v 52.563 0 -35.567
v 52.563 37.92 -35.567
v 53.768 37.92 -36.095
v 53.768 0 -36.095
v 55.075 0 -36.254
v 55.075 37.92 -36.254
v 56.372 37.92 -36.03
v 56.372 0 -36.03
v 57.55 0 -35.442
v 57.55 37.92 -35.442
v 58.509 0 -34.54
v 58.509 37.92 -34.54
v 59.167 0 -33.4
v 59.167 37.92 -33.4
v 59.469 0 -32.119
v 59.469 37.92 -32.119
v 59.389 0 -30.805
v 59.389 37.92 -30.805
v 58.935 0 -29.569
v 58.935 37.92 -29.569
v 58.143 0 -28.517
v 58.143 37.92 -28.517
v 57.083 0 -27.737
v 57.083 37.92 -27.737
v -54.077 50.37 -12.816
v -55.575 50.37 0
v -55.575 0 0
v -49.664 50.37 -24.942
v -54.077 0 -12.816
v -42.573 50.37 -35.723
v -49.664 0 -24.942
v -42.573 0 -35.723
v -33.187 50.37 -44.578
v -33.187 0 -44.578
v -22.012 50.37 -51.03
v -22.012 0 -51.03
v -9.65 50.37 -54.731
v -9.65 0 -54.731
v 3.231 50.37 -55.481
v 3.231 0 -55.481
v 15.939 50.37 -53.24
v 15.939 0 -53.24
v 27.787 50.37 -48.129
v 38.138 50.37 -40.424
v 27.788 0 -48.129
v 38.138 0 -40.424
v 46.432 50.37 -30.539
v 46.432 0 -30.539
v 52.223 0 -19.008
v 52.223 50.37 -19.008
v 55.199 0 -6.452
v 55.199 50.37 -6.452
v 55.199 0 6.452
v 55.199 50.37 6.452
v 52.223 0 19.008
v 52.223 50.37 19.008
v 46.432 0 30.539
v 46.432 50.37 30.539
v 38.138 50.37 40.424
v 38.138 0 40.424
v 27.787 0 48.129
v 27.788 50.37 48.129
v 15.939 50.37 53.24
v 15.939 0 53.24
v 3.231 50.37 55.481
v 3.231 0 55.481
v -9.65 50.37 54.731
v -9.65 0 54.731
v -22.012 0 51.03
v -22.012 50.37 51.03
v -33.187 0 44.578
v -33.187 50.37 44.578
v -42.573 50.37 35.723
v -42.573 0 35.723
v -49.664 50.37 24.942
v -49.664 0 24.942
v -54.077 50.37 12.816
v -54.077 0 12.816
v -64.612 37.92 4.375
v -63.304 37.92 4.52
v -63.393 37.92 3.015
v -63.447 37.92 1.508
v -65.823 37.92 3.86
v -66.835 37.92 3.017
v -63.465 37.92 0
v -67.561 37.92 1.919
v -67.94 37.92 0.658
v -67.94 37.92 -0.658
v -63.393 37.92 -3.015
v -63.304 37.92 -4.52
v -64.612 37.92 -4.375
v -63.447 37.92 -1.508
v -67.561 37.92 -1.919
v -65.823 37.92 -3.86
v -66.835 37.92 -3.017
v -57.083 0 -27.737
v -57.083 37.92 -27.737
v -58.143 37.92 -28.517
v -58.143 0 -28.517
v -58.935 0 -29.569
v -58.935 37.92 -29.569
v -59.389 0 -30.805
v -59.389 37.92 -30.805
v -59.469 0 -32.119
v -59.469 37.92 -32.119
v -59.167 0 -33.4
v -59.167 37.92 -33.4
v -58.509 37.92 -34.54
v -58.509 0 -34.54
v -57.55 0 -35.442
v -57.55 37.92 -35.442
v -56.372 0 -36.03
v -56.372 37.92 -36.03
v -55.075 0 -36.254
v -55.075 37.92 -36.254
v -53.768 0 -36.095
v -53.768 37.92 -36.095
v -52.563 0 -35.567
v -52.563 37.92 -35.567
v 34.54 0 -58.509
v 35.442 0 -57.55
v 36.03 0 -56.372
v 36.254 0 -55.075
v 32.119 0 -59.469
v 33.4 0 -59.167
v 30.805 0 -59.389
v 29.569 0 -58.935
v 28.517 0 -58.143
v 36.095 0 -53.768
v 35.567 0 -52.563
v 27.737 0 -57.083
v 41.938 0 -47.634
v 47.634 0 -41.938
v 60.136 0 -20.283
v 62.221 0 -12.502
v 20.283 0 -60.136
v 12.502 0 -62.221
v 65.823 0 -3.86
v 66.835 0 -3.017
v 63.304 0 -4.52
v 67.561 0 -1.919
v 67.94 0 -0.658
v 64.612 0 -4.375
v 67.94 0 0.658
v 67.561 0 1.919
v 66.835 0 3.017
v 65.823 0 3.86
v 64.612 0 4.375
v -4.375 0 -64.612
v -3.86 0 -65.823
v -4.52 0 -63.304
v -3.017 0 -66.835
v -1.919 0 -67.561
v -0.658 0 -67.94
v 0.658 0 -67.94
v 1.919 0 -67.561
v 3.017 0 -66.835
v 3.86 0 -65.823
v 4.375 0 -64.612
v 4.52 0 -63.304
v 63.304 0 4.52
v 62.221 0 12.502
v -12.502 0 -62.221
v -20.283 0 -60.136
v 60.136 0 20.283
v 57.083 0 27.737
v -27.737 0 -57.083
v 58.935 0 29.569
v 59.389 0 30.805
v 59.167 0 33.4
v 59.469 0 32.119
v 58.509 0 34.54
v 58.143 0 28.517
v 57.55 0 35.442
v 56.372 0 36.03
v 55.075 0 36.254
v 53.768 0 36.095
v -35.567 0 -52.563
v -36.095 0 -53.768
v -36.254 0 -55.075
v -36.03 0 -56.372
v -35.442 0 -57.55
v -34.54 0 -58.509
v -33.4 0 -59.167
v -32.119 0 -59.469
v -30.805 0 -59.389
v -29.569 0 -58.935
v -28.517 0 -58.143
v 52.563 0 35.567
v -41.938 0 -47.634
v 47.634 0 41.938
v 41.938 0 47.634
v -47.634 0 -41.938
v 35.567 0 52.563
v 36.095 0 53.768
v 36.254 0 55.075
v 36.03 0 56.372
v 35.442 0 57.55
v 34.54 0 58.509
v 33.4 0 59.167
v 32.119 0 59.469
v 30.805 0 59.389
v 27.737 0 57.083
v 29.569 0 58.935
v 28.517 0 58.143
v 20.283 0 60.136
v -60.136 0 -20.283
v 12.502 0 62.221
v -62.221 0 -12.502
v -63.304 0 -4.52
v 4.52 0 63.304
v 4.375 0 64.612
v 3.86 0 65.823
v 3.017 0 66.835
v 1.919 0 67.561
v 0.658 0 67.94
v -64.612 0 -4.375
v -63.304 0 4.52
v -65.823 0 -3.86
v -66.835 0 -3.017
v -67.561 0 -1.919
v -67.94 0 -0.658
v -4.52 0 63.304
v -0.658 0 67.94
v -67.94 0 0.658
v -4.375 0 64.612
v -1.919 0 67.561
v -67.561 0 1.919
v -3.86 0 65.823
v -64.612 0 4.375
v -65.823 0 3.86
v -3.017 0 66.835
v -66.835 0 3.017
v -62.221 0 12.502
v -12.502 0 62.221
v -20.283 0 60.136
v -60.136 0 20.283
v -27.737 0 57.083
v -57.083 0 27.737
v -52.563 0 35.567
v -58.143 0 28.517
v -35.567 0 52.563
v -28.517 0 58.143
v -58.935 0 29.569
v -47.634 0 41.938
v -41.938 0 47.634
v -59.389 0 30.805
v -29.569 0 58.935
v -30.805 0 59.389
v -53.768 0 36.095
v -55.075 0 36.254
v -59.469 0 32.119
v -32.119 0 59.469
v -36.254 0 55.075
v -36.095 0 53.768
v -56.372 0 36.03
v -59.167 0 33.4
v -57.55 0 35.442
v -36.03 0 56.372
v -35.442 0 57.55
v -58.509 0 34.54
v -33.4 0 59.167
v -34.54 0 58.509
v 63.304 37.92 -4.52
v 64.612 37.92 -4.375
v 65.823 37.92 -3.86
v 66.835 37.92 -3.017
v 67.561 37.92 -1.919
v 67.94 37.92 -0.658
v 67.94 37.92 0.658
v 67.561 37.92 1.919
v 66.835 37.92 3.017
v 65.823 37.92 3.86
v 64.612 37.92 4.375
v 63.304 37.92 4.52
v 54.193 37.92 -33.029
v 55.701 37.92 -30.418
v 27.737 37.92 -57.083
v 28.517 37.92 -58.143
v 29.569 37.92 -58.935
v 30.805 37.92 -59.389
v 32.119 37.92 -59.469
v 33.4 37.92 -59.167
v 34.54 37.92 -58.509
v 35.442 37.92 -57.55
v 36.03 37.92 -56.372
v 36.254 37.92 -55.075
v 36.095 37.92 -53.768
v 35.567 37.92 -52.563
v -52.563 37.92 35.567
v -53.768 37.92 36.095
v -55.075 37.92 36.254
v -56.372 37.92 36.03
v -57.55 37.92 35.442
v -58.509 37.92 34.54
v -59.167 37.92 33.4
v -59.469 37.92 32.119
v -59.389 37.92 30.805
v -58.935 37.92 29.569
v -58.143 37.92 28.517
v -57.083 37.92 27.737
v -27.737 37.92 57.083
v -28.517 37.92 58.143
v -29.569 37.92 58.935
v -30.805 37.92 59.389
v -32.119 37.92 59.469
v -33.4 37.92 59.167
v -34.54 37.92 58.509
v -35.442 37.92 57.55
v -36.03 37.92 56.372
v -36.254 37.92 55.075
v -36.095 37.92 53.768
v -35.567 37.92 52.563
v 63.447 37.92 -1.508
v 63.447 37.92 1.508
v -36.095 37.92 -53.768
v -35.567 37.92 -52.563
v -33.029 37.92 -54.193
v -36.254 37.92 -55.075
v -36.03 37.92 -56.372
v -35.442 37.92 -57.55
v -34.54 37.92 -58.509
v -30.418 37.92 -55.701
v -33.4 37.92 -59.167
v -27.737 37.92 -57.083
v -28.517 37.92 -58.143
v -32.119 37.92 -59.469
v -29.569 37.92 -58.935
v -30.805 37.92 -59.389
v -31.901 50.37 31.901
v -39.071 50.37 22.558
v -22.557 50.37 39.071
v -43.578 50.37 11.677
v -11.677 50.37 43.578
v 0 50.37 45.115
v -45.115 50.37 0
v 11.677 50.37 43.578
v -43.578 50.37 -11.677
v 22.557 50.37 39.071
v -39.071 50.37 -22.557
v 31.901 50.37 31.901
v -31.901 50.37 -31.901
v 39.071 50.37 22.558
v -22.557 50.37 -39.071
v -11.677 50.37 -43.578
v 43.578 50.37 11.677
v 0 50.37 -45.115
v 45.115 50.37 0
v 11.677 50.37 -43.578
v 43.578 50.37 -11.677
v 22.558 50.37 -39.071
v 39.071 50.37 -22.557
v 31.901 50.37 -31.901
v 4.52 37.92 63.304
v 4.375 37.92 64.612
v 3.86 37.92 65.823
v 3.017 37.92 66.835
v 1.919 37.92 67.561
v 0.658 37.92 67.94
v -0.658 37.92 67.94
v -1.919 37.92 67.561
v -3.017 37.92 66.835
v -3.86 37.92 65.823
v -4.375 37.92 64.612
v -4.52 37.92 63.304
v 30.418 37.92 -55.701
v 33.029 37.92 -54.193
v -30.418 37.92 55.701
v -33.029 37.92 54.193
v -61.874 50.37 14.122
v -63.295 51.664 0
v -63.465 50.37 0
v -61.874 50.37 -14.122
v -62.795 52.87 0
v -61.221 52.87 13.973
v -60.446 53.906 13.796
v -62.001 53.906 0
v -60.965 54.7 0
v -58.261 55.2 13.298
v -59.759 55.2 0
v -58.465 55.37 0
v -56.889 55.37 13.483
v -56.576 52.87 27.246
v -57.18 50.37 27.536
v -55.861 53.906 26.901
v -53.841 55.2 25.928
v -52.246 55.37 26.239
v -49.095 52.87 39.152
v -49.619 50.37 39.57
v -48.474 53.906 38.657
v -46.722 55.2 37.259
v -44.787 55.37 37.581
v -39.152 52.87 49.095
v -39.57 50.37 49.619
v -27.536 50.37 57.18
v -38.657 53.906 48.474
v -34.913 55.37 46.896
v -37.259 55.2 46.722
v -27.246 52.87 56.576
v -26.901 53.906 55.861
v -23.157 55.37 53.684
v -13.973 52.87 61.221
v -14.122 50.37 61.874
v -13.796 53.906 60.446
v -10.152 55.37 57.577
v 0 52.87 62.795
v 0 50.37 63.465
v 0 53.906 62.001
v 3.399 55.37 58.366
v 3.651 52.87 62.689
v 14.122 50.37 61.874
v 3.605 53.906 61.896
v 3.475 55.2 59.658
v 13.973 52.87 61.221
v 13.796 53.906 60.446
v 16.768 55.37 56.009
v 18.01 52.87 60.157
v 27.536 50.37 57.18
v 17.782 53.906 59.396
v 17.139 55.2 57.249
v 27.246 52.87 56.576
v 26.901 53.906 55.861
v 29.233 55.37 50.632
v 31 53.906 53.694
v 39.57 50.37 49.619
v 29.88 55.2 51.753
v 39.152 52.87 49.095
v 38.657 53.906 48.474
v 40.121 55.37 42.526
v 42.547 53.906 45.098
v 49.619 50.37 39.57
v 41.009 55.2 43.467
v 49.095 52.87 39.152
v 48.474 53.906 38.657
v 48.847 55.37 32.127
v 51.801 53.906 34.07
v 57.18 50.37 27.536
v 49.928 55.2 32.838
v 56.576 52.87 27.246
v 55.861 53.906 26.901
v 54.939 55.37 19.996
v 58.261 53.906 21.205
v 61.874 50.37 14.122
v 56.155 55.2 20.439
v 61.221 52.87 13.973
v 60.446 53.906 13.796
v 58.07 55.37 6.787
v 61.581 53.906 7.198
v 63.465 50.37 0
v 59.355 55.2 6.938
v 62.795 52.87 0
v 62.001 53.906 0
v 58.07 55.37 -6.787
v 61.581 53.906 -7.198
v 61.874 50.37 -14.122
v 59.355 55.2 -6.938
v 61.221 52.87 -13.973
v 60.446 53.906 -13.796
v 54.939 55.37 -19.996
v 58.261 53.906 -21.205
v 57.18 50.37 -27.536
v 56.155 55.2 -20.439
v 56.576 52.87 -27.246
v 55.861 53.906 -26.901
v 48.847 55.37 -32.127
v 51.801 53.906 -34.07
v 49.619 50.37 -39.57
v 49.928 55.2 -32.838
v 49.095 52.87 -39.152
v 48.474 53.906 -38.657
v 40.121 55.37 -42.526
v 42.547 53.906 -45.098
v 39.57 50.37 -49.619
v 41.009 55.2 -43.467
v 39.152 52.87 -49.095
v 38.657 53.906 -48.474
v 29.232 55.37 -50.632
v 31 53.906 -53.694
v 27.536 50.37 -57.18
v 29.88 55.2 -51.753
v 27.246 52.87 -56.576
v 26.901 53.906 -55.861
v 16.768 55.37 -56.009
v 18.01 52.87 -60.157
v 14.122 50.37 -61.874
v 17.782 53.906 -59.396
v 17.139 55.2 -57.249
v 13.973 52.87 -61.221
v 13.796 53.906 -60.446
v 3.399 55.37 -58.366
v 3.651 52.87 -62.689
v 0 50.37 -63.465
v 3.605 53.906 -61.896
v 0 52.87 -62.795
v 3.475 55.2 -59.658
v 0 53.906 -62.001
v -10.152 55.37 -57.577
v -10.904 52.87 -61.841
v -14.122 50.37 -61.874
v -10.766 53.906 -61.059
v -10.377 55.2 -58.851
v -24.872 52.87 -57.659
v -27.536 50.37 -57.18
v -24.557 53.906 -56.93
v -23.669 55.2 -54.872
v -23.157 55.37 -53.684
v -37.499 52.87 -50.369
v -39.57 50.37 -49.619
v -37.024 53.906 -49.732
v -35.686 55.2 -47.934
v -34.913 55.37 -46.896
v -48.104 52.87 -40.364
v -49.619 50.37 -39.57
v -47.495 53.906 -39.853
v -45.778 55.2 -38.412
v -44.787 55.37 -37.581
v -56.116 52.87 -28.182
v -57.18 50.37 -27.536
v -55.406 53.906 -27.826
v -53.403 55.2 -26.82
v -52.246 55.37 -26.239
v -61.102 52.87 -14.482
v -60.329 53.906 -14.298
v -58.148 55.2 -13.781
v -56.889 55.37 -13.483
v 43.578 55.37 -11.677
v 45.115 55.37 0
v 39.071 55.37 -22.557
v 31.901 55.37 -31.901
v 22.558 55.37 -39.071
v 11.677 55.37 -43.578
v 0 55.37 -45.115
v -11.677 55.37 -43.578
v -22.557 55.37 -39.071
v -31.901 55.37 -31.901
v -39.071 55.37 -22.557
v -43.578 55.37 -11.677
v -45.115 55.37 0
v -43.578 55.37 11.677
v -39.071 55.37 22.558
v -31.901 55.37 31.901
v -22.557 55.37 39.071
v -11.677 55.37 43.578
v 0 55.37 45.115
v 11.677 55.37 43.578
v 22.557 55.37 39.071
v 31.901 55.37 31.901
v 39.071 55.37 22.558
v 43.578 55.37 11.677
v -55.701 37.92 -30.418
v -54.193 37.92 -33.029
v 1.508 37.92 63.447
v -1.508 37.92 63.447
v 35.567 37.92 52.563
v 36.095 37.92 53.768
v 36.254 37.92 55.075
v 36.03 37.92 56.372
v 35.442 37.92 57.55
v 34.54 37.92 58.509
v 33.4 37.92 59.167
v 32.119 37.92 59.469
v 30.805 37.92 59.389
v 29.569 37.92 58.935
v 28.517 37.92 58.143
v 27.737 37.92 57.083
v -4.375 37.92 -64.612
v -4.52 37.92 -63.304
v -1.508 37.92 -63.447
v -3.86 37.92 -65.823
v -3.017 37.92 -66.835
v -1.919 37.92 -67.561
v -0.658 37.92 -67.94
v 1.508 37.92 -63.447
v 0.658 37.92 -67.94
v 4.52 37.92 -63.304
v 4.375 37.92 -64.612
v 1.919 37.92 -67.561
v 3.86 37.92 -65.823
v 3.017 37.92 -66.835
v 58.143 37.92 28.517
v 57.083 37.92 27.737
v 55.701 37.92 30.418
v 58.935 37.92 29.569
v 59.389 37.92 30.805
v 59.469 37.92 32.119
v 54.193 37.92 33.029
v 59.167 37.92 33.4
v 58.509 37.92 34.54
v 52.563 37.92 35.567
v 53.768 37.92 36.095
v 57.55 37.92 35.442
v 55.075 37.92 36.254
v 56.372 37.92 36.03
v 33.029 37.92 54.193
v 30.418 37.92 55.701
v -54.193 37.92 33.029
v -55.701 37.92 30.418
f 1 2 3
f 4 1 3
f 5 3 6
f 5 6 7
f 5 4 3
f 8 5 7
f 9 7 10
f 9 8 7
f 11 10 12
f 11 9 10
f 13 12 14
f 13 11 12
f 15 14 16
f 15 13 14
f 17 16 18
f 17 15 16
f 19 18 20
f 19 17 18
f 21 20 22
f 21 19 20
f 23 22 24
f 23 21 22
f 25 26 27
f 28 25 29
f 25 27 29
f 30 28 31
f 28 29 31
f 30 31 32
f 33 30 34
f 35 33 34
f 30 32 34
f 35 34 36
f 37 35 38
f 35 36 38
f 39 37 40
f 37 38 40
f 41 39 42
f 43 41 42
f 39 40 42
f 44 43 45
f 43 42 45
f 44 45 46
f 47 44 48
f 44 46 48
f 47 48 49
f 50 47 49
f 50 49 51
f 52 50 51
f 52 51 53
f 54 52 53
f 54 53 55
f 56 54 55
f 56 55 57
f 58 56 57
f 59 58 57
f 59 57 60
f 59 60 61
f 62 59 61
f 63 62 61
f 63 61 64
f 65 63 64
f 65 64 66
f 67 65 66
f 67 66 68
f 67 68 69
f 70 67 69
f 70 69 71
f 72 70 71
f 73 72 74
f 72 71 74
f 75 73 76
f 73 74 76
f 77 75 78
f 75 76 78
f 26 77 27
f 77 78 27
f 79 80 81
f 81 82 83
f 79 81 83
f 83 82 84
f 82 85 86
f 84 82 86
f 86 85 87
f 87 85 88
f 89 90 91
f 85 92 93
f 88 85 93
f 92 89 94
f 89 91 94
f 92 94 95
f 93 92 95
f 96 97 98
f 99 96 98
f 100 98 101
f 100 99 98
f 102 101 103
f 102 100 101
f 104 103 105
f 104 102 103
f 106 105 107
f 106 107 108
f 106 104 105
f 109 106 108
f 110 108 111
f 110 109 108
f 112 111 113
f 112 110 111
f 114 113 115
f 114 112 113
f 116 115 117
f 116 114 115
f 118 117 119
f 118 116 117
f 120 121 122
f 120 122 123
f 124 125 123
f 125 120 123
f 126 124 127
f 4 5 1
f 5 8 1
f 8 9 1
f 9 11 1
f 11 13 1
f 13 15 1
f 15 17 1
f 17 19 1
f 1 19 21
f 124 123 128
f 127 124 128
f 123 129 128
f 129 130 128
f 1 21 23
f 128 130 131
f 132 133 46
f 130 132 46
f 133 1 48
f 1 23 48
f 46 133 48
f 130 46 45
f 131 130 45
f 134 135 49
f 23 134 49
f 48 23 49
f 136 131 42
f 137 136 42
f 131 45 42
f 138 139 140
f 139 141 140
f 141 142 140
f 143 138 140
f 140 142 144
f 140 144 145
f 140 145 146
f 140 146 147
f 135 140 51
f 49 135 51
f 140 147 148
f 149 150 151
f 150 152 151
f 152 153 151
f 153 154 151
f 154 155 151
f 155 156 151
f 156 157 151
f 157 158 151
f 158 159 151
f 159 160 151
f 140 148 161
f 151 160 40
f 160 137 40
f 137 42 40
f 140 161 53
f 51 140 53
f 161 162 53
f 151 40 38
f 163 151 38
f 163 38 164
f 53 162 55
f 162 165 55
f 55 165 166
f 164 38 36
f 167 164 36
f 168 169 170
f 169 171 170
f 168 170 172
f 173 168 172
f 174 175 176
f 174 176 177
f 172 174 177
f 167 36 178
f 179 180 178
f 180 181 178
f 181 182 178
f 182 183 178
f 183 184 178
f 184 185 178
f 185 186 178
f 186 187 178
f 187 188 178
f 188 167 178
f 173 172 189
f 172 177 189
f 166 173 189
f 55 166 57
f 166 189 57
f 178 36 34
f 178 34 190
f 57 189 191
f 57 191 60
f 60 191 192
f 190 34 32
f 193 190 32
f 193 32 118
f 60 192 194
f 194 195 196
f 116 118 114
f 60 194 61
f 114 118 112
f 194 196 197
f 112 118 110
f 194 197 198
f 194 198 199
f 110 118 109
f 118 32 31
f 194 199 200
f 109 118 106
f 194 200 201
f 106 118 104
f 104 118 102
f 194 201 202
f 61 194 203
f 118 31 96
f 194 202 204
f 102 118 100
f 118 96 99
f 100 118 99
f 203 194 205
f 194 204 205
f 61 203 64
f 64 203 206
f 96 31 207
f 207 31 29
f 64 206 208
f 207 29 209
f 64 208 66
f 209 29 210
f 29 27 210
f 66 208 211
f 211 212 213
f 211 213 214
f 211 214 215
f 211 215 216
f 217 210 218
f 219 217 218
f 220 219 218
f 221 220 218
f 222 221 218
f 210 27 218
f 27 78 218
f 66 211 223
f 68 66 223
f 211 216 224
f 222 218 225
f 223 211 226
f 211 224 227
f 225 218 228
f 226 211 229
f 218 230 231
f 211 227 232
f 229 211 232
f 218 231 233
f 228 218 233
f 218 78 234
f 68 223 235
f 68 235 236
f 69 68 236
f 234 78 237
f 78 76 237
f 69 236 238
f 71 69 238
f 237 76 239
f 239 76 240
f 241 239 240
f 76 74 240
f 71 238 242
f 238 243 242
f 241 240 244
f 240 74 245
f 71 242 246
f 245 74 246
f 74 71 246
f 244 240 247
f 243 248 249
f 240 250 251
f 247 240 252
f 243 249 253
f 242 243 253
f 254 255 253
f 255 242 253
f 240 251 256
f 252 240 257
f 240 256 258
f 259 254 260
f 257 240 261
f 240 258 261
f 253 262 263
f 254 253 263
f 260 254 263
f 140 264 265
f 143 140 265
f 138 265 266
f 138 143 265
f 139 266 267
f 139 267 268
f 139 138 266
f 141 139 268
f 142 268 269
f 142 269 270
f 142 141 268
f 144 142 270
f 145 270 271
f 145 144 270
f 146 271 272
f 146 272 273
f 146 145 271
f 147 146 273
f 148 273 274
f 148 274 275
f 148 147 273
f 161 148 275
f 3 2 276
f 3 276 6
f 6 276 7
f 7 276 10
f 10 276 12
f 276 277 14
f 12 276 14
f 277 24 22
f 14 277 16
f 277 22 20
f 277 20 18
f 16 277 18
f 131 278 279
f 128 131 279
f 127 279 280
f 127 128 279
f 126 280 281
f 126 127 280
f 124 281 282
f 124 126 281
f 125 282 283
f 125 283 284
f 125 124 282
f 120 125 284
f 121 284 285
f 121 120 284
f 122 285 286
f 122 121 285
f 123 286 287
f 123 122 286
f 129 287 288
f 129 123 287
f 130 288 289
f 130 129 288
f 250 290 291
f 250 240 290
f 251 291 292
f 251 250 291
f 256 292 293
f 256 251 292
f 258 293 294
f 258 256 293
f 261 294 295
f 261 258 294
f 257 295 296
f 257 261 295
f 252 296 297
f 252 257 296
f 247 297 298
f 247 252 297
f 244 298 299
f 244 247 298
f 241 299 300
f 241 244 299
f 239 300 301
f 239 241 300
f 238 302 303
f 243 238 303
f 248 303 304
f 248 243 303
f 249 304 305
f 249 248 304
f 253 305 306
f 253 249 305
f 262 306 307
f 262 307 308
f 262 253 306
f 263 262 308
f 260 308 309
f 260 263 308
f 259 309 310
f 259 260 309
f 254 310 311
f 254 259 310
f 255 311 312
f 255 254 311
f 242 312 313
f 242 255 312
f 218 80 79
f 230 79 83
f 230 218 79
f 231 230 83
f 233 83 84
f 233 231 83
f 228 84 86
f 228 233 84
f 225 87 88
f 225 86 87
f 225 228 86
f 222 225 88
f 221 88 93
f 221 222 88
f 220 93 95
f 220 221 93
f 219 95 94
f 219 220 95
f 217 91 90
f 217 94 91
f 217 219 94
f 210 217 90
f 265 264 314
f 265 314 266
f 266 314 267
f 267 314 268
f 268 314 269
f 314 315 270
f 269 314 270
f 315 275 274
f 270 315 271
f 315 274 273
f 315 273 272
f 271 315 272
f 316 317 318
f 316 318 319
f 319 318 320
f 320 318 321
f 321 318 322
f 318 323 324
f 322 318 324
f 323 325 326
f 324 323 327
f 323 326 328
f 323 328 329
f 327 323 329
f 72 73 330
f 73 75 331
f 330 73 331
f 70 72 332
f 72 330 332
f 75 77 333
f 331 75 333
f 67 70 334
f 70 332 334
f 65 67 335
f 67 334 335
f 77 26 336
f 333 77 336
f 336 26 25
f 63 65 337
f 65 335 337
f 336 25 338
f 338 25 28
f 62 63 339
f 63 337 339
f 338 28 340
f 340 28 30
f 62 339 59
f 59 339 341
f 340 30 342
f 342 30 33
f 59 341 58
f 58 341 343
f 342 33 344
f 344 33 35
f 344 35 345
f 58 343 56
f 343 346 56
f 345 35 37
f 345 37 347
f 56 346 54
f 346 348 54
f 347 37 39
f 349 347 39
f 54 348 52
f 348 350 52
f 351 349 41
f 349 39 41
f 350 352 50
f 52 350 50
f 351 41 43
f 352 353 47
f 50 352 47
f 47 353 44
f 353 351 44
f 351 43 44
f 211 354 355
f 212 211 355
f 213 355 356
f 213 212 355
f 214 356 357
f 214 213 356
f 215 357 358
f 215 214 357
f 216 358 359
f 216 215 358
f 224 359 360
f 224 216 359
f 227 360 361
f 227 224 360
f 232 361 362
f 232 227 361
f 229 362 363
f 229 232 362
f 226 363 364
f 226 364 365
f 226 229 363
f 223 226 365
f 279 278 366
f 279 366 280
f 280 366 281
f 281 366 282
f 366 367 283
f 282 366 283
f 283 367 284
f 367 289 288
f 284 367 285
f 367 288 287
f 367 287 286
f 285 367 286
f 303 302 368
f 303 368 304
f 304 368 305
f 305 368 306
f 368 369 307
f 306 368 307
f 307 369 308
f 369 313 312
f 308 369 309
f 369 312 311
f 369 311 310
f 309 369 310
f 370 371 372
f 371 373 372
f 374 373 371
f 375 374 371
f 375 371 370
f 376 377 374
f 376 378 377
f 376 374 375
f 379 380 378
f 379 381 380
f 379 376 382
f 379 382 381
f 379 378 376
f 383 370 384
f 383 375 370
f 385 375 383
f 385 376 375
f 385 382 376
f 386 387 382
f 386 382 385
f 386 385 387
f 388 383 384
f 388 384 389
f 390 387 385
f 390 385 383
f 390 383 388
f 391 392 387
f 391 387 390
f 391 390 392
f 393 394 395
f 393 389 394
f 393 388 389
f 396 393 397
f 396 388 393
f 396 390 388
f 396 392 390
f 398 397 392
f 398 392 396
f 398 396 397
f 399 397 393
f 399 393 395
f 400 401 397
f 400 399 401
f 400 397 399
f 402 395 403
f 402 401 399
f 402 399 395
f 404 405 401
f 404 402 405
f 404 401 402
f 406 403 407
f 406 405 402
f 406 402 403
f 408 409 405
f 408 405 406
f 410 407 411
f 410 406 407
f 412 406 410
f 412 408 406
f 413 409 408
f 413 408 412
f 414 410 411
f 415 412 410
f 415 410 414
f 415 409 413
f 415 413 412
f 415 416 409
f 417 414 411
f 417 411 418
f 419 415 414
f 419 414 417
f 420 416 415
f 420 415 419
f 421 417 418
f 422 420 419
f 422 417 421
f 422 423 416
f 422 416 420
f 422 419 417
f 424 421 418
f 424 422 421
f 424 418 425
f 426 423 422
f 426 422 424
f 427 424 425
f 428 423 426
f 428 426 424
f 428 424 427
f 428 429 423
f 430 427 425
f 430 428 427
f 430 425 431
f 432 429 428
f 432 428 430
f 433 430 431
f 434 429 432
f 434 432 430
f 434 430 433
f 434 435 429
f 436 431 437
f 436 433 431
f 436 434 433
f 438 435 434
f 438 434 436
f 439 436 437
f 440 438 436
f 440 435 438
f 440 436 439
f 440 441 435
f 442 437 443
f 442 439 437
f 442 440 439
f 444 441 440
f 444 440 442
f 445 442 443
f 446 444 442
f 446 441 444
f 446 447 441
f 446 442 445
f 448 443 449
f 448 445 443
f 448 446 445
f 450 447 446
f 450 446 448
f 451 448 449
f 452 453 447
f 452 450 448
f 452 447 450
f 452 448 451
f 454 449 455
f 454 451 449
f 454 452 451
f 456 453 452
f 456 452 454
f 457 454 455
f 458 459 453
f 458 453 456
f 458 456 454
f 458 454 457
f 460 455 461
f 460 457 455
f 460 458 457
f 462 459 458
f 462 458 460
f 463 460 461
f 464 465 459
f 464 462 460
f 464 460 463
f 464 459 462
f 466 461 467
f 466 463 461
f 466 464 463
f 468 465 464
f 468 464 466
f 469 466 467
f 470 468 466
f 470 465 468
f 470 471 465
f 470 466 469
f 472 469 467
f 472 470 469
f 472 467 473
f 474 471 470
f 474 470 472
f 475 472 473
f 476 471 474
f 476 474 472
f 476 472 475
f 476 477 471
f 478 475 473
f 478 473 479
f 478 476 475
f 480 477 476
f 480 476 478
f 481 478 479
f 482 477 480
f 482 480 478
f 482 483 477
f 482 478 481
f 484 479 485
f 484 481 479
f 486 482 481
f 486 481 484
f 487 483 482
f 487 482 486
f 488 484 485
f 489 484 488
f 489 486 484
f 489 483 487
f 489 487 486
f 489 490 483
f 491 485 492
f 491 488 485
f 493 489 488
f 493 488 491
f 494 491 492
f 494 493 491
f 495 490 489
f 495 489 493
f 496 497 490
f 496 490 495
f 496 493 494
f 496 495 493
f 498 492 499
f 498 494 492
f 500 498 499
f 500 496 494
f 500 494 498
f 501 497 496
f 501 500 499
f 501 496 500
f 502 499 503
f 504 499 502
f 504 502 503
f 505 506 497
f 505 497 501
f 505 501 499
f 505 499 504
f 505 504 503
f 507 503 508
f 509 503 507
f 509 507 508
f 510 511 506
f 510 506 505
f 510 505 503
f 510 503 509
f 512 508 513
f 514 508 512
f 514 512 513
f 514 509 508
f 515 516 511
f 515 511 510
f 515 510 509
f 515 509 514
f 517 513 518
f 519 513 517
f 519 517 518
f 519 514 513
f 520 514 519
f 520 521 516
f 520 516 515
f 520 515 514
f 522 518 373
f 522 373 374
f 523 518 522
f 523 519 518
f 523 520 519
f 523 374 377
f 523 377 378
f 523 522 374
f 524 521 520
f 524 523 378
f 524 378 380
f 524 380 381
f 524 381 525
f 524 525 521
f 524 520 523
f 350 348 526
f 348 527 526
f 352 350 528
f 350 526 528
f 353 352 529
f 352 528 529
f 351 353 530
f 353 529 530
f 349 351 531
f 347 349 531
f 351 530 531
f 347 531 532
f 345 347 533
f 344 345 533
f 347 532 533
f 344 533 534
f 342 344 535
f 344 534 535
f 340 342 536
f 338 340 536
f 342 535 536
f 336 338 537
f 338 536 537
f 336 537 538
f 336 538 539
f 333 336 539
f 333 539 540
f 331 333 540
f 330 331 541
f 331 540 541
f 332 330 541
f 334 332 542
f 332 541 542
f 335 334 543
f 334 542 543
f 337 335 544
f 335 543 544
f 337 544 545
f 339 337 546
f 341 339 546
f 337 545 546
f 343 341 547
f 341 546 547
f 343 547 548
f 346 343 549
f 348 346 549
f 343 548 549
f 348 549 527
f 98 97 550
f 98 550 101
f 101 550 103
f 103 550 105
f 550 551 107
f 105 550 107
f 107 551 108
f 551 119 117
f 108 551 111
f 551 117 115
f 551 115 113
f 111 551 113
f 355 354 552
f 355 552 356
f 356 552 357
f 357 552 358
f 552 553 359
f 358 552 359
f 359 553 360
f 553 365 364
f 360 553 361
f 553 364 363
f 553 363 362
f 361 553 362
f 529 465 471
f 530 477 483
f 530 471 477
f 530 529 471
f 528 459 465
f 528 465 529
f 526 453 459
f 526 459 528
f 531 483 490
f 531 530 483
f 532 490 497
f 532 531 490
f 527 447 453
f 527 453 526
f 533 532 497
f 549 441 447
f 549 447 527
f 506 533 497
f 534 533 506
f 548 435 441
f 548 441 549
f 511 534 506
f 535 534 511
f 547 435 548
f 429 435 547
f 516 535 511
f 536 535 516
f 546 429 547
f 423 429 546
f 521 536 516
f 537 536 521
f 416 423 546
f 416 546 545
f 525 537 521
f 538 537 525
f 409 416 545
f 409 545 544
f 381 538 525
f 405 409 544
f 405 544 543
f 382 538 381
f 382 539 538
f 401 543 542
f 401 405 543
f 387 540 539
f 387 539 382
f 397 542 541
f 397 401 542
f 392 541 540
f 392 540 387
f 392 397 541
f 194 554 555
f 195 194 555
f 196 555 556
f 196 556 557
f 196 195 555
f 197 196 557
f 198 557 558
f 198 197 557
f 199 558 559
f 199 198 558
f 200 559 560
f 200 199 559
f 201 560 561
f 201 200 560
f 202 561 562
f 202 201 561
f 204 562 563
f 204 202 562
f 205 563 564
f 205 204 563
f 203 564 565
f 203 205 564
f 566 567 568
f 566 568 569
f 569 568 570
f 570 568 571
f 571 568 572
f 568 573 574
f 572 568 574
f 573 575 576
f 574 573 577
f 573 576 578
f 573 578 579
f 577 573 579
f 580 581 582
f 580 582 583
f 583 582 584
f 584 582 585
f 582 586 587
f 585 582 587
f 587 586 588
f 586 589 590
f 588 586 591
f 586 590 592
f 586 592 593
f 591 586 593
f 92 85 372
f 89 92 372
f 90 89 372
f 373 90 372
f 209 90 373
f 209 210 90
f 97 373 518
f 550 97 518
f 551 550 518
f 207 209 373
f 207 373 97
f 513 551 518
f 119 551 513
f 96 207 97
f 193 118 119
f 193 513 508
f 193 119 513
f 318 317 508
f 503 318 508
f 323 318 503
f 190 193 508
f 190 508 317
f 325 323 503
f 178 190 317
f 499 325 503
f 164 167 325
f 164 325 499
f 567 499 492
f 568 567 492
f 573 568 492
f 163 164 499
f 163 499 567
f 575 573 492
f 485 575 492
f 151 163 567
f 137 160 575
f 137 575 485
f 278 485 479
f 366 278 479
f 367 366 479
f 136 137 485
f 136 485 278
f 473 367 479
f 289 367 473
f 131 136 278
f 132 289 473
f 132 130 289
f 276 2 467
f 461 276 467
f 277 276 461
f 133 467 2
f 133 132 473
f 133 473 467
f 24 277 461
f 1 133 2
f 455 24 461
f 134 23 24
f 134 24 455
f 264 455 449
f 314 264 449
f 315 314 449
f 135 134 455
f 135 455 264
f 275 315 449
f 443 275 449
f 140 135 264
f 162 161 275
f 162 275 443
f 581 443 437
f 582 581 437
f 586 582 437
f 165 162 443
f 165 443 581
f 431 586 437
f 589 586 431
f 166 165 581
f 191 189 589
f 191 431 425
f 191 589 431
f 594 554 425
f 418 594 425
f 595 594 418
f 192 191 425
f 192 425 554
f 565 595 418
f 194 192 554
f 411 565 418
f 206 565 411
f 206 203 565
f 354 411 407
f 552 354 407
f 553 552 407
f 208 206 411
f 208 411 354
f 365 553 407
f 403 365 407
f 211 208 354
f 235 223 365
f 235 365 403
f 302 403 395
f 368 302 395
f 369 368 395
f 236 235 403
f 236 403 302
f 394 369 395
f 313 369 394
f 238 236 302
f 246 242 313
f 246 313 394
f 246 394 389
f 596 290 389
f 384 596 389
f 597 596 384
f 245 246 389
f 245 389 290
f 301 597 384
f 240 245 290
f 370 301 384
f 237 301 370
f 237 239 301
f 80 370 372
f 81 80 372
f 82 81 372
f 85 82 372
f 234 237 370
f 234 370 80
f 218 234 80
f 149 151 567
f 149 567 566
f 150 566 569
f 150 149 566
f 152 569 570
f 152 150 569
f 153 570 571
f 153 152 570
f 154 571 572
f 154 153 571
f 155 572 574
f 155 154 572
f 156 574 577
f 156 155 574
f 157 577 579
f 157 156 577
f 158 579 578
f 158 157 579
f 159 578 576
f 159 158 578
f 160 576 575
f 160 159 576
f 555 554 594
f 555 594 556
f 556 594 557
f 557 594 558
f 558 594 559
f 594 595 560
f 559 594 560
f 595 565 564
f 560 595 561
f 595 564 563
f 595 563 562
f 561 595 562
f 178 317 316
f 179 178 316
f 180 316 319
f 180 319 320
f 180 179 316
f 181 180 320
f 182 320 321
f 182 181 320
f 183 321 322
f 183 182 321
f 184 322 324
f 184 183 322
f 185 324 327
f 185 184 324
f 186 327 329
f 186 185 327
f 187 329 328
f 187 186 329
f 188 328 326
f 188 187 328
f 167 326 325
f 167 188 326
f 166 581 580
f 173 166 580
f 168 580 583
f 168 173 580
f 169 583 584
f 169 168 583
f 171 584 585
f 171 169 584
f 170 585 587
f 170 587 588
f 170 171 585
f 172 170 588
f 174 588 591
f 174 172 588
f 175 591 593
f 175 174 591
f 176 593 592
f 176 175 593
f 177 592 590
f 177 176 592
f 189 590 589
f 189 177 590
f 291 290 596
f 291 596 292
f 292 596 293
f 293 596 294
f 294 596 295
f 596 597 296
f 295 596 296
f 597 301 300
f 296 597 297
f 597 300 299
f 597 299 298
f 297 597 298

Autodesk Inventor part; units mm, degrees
ref_plane "YZ Plane" through (0, 0, 0) normal (1, 0, 0) x (0, 1, 0)
ref_plane "XZ Plane" through (0, 0, 0) normal (0, 1, 0) x (-1, 0, 0)
ref_plane "XY Plane" through (0, 0, 0) normal (0, 0, 1) x (1, 0, 0)
sketch "Sketch1" plane through (0, 0, 0) normal (0, 1, 0) x (-1, 0, 0)
  circle A0 centre (0, 0) radius 63.465
  circle A1 centre (0, 0) radius 55.575
  dimension "d0" = 126.93
  dimension "d1" = 111.15
extrude "Extrusion1" add sketch "Sketch1" along normal blind 55.37
sketch "Sketch2" plane through (0, 55.37, 0) normal (0, 1, 0) x (1, 0, 0)
  circle A0 centre (0, 0) radius 63.465 projected
  circle A1 centre (0, 0) radius 45.115
  dimension "d4" = 90.23
extrude "Extrusion2" add sketch "Sketch2" against normal blind 5
fillet "Fillet1" radius 5 1 edges at (63.465, 55.37, 0)
sketch "Sketch3" plane through (0, 0, 0) normal (0, -1, 0) x (1, 0, 0)
  circle A0 centre (0, 0) radius 63.465 projected
  circle A1 centre (63.465, 0) radius 4.5231
extrude "Extrusion3" add sketch "Sketch3" against normal blind 37.92 contours A0 A1 | A0 A1 picked at (62.045, -1.0257) picked at (64.8107, -1.1706)
pattern_circular "Circular Pattern1" count 12 over 360 about axis through (0, 0, 0) along (0, 1, 0) of "Extrusion3"
properties part number "00_Compression_Coupling_3inch_KingBrothers_CPC-3000_locking"
